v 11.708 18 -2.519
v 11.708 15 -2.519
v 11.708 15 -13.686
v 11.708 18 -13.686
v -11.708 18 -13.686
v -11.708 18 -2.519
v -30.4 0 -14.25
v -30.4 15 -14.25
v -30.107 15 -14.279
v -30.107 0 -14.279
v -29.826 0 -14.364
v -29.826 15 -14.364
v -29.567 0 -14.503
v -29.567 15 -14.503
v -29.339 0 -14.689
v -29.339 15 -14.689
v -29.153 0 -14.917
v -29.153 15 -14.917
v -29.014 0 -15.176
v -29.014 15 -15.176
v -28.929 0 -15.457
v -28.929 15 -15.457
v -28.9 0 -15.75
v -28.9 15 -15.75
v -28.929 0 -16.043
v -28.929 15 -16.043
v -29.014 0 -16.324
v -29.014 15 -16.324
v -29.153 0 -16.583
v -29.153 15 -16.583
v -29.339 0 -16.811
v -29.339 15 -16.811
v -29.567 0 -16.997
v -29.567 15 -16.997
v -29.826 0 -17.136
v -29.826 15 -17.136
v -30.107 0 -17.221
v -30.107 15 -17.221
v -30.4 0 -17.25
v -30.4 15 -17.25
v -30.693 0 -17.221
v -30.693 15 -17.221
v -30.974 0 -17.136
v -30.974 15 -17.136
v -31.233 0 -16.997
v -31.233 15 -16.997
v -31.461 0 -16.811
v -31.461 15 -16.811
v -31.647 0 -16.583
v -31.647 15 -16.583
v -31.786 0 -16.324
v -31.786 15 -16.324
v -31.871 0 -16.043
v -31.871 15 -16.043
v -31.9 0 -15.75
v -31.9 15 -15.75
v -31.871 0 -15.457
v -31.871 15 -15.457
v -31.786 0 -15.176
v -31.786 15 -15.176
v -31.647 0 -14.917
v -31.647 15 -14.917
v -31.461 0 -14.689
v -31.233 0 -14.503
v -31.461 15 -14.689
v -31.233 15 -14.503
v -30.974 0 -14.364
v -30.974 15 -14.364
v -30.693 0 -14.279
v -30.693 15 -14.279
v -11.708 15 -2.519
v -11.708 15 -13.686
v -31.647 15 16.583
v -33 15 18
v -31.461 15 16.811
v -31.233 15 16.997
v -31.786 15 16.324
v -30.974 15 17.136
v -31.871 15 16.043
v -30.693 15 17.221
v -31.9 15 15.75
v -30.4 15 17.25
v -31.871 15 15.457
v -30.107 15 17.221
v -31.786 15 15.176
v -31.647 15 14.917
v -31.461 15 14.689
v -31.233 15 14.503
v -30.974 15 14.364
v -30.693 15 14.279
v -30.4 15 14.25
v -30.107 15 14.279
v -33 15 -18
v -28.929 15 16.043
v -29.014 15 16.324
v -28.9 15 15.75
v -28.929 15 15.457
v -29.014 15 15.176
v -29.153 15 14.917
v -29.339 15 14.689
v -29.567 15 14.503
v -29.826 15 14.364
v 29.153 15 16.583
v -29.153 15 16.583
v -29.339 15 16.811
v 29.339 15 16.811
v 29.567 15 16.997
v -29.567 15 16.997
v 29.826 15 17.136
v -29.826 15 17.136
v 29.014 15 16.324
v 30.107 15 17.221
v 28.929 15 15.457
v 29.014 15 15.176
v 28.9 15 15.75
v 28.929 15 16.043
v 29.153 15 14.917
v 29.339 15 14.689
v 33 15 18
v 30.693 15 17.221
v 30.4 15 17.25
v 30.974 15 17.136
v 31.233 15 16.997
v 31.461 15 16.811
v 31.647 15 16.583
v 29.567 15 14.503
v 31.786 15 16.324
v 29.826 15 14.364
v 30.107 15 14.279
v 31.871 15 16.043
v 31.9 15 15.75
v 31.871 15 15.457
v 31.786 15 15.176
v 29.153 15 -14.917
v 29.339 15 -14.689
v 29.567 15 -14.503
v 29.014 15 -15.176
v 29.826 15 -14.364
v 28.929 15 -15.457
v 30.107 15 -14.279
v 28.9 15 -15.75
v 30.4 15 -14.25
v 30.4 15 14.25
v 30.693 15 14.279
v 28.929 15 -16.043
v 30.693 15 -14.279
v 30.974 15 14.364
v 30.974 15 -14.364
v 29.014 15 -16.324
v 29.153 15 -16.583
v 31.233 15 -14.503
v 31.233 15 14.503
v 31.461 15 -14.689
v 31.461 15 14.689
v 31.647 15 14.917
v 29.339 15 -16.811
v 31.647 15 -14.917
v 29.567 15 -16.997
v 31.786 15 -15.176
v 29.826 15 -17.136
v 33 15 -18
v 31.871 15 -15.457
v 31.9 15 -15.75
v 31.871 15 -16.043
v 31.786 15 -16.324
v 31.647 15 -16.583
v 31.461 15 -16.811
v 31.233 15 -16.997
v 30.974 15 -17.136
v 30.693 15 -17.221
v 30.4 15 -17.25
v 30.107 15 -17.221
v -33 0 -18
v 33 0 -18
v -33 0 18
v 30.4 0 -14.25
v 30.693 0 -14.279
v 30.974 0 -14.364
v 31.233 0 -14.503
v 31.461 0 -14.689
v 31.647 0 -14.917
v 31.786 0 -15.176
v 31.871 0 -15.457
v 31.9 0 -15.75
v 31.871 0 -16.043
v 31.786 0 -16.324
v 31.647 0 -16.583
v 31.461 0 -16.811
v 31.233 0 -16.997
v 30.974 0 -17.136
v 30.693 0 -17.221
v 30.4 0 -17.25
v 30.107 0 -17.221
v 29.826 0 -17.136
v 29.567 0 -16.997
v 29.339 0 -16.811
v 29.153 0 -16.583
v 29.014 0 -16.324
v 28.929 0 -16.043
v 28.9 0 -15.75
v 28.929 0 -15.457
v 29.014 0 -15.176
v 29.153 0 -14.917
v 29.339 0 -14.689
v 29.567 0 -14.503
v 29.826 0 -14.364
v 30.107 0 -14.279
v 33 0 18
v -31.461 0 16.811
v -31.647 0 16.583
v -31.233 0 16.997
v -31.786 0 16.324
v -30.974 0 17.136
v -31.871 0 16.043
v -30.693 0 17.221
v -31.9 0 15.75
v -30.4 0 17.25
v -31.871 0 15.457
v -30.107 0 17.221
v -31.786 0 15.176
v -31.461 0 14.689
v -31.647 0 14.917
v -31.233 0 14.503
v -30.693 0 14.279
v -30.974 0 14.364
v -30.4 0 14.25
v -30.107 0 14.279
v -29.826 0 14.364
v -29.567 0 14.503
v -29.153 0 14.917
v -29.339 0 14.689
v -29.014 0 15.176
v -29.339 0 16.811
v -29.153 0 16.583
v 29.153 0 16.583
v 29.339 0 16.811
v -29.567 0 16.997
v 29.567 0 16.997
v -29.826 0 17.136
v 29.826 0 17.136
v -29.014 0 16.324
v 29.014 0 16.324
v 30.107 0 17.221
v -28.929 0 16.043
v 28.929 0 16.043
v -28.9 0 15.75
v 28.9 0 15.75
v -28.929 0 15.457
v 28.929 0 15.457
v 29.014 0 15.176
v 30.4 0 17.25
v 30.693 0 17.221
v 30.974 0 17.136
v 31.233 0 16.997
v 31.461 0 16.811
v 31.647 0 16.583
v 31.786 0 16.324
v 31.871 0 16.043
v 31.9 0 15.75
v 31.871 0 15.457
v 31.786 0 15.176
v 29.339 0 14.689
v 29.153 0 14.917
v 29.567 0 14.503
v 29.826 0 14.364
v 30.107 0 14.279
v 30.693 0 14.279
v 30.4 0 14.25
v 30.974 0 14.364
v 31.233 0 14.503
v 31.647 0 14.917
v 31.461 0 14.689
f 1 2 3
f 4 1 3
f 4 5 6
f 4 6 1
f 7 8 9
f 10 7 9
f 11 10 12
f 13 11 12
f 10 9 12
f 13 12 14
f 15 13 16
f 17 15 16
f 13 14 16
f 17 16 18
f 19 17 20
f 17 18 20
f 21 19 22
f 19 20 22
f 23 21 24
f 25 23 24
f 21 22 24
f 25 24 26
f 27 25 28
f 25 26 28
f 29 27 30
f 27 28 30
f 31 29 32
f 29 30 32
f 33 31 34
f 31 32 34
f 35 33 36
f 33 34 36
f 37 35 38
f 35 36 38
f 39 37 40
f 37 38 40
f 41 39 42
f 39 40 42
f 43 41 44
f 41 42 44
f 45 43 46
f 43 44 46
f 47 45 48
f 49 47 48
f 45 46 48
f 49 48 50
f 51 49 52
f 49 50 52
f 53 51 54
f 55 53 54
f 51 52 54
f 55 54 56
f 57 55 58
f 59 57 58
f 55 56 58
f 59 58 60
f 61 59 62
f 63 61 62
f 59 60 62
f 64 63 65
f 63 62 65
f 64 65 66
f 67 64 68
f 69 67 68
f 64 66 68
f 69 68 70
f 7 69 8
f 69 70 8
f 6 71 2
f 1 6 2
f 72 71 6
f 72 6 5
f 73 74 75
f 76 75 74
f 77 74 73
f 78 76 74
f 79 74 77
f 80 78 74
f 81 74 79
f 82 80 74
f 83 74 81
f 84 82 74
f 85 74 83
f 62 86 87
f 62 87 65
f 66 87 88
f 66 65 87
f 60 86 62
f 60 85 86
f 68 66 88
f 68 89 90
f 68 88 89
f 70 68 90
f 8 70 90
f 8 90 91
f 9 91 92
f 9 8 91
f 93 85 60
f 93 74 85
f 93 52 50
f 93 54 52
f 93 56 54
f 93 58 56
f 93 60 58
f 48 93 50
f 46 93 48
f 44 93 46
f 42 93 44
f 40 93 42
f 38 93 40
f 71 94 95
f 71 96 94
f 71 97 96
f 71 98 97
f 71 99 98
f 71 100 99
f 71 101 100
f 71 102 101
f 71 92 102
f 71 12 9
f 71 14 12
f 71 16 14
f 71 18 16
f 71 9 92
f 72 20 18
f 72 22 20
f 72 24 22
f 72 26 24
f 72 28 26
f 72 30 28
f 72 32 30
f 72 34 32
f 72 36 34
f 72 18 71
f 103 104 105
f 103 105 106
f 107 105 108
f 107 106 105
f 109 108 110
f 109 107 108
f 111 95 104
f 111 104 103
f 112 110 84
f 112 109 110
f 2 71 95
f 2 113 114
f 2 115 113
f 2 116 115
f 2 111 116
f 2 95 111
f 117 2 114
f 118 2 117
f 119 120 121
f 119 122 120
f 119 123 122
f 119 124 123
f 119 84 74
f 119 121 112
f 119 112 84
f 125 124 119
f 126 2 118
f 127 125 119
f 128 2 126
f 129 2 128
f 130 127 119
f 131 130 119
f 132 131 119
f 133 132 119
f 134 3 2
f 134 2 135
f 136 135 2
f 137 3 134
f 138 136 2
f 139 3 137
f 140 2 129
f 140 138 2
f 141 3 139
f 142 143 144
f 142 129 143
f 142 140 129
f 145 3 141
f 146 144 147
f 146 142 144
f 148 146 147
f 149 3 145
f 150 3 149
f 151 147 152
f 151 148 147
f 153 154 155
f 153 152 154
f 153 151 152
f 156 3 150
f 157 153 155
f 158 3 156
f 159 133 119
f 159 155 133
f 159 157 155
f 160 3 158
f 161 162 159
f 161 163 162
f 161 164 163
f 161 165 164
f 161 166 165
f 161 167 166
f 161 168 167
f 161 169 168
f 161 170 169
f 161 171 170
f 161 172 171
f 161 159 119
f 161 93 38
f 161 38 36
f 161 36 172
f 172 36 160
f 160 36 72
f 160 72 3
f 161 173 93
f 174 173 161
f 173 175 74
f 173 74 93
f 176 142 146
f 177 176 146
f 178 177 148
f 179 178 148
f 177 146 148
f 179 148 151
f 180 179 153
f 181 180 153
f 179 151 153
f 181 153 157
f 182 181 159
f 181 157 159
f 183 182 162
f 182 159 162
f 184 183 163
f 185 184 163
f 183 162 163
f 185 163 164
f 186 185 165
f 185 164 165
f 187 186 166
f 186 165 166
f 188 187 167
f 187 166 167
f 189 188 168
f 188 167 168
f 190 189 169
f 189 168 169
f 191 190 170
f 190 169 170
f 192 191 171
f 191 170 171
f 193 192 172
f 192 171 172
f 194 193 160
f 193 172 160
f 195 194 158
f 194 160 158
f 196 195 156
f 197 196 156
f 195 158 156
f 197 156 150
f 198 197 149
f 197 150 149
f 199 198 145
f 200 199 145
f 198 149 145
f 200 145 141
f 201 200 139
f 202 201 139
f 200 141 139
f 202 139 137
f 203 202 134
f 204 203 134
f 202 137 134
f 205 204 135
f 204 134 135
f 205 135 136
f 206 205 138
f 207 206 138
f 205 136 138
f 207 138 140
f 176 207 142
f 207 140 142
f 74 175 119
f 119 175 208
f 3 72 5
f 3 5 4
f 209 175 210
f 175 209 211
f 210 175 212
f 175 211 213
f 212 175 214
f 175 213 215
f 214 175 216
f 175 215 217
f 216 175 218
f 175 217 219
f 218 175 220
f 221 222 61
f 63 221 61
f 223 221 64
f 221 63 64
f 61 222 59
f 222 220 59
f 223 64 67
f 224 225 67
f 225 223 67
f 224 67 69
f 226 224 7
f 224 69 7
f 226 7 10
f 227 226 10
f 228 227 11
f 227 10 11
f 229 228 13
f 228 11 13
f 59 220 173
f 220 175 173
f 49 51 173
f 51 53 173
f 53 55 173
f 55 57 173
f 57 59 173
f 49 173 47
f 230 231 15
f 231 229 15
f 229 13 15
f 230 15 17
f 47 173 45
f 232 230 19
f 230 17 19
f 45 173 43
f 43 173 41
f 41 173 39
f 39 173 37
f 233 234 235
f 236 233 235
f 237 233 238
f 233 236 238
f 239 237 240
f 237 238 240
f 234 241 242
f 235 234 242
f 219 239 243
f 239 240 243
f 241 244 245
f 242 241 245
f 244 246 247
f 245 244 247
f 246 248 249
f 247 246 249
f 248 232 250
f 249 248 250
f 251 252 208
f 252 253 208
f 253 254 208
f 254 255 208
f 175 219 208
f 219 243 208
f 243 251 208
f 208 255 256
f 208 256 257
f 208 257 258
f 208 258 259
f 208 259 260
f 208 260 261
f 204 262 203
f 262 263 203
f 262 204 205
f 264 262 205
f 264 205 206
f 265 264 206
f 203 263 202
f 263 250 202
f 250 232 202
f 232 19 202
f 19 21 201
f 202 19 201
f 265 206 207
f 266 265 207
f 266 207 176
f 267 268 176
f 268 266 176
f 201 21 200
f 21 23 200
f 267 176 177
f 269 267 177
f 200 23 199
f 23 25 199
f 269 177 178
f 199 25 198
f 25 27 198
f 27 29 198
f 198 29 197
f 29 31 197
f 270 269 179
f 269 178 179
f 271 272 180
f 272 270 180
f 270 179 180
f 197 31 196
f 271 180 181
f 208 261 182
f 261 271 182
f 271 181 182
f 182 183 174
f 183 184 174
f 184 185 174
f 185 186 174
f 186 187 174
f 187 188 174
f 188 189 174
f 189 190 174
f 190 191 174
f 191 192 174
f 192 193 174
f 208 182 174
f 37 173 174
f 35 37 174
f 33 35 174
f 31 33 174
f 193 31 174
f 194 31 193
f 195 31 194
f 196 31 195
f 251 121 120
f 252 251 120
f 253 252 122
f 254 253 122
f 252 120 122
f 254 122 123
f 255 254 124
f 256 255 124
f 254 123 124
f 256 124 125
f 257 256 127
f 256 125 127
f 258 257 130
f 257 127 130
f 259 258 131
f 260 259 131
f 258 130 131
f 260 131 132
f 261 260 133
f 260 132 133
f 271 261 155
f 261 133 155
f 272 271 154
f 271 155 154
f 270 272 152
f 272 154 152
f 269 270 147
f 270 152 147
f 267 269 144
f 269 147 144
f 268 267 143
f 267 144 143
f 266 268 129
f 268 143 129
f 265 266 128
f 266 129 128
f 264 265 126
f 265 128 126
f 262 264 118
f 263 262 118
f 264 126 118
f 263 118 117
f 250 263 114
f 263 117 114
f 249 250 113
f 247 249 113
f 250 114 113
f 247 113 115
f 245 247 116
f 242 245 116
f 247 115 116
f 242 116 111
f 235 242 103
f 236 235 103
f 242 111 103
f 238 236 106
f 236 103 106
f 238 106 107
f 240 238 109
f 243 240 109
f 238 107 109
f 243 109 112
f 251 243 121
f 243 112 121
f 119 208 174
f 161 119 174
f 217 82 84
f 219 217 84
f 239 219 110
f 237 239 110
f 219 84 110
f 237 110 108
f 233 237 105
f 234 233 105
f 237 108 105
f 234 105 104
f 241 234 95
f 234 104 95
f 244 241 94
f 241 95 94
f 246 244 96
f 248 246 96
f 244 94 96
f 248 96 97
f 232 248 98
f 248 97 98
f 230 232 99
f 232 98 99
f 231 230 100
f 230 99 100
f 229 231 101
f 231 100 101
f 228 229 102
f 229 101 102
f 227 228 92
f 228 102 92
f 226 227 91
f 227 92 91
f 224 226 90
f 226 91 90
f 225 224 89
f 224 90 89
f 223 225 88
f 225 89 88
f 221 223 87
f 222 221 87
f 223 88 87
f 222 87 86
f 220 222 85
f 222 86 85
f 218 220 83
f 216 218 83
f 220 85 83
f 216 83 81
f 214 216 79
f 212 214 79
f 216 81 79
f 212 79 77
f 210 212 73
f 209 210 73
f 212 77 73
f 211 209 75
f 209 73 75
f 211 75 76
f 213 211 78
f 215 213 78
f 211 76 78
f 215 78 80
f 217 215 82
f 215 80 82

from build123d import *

# Parameters (mm, degrees)
SKETCH1_W           = 66
SKETCH1_H           = 36
BOSS_EXTRUDE1_DEPTH = 15
SKETCH2_R           = 1.5
CUT_EXTRUDE1_DEPTH  = 15
SKETCH3_W           = 23.416915526
SKETCH3_H           = 11.166785339
BOSS_EXTRUDE2_DEPTH = 3


with BuildPart() as part:
    # Sketch1 → Boss-Extrude1 (new body)
    with BuildSketch(Plane(origin=(0, 0, 0), x_dir=(1, 0, 0), z_dir=(0, 1, 0))):
        Rectangle(SKETCH1_W, SKETCH1_H)
    extrude(amount=BOSS_EXTRUDE1_DEPTH)

    # Sketch2 → Cut-Extrude1 (cut)
    with BuildSketch(Plane(origin=(0, 15, 0), x_dir=(1, 0, 0), z_dir=(0, 1, 0))):
        with Locations(Location((-30.4, 15.75, 0), (0, 0, 270))):
            Circle(SKETCH2_R)
        with Locations(Location((-30.4, -15.75, 0), (0, 0, 270))):
            Circle(SKETCH2_R)
        with Locations(Location((30.4, 15.75, 0), (0, 0, 270))):
            Circle(SKETCH2_R)
        with Locations(Location((30.4, -15.75, 0), (0, 0, 270))):
            Circle(SKETCH2_R)
    extrude(amount=-CUT_EXTRUDE1_DEPTH, mode=Mode.SUBTRACT)

    # Sketch3 → Boss-Extrude2 (add)
    with BuildSketch(Plane(origin=(0, 15, 0), x_dir=(1, 0, 0), z_dir=(0, 1, 0))):
        with Locations((0, 8.102465218)):
            Rectangle(SKETCH3_W, SKETCH3_H)
    extrude(amount=BOSS_EXTRUDE2_DEPTH)


solid = part.part
